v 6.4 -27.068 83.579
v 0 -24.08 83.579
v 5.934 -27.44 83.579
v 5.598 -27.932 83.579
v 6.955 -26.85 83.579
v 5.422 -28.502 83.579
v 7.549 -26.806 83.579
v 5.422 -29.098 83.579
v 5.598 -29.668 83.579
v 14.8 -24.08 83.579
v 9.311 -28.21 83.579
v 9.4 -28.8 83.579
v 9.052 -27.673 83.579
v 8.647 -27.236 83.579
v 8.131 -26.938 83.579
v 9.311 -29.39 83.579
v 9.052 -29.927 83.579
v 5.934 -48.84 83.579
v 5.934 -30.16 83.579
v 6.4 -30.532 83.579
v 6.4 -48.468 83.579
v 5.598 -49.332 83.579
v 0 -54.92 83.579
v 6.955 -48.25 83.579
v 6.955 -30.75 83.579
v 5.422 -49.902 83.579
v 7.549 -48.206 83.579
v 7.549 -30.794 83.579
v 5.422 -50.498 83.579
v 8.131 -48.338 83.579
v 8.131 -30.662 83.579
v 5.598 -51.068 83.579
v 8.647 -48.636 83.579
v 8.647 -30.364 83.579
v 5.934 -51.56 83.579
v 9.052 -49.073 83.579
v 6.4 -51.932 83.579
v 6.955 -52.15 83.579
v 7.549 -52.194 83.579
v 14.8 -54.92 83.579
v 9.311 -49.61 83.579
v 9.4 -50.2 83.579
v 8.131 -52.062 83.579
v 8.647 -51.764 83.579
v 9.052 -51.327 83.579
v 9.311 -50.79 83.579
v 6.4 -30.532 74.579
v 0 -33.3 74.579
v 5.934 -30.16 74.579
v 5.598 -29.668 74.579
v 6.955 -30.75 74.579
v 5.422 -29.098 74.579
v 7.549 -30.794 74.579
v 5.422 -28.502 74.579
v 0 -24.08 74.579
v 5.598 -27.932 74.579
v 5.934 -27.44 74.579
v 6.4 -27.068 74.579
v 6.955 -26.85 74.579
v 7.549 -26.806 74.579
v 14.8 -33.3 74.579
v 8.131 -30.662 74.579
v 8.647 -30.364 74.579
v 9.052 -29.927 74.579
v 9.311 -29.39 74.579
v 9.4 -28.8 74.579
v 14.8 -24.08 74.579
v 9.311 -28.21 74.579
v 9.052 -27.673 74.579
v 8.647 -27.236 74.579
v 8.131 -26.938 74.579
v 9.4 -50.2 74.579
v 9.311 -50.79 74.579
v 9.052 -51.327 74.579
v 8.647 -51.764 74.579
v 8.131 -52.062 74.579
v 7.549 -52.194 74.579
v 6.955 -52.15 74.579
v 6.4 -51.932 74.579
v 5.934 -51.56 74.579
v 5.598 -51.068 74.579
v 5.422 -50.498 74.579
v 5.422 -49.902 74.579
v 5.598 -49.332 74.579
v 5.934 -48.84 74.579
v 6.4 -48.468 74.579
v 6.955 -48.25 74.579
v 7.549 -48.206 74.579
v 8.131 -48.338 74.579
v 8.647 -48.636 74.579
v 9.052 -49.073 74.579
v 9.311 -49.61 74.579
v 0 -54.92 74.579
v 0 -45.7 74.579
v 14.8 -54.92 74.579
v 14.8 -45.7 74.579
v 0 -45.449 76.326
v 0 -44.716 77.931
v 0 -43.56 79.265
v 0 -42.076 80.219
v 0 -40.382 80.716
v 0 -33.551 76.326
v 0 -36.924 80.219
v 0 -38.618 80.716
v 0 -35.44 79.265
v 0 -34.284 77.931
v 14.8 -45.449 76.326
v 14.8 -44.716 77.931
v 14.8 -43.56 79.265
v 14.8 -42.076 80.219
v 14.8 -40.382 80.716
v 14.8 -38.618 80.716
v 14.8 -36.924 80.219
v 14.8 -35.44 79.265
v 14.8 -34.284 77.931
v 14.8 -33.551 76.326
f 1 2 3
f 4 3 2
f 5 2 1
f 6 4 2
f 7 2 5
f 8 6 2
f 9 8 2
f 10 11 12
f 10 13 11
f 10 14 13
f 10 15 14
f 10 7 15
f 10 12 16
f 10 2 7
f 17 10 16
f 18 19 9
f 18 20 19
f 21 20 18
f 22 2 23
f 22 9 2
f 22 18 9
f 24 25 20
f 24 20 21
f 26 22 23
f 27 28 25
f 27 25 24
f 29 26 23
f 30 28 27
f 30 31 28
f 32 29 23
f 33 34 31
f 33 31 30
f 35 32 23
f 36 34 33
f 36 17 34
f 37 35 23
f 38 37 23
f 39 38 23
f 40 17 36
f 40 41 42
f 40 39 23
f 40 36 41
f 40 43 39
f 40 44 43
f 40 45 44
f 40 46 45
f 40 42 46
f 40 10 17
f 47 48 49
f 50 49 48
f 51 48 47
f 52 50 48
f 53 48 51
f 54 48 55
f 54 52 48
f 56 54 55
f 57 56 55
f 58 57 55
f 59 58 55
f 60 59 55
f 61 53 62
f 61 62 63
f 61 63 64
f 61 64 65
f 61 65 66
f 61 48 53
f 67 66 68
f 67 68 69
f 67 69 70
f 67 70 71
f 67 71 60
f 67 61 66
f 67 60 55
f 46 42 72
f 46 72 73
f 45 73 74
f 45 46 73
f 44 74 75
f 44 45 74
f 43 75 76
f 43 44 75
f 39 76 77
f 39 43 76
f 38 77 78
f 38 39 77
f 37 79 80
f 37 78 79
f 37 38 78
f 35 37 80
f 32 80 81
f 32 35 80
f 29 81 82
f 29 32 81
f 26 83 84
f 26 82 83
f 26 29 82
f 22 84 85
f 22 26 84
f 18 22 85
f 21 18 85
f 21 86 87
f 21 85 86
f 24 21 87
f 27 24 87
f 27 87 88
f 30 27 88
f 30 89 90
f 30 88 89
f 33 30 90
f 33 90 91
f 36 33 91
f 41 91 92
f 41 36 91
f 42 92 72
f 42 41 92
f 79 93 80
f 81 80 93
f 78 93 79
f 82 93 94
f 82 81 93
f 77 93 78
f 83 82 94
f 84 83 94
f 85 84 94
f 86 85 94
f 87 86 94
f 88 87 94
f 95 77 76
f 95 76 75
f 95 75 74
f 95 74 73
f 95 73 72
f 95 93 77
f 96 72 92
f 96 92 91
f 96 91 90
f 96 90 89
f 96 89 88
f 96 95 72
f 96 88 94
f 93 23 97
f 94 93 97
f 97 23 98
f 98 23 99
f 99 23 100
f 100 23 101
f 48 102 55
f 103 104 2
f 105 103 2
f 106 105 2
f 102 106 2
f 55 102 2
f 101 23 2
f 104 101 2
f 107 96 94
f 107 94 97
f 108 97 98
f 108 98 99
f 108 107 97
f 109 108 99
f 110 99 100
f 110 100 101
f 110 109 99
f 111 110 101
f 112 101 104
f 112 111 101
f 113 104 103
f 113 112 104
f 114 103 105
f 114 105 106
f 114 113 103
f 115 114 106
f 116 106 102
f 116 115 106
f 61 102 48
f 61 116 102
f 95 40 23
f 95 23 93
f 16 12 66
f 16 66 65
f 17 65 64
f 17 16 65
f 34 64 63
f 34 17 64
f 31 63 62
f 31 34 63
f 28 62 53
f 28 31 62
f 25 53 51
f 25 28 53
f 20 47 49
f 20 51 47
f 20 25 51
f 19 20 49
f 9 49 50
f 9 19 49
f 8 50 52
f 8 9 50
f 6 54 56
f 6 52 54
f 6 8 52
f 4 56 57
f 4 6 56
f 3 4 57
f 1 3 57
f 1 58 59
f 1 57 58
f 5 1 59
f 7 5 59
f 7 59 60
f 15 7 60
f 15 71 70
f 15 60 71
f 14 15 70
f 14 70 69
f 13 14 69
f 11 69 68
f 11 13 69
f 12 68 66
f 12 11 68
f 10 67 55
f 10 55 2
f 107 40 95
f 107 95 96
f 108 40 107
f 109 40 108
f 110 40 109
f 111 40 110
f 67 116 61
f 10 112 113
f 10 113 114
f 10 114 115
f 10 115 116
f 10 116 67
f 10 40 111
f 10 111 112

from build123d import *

# Parameters (mm, degrees)
SKETCH2_W               = 180
SKETCH2_H               = 9
BOSS_EXTRUDE1_DEPTH     = 14.8
SKETCH7_W               = 90
SKETCH7_H               = 4.5
CUT_EXTRUDE1_DEPTH      = 92.319713096
FILLET1_R               = 8
BOSS_EXTRUDE2_DEPTH     = 14.8
CUT_EXTRUDE2_DEPTH      = 175.130679781
CUT_EXTRUDE2_DEPTH_BACK = 175.130679781
SKETCH11_R              = 2
CUT_EXTRUDE3_DEPTH      = 107.467114171
CUT_EXTRUDE3_DEPTH_BACK = 107.467114171


with BuildPart() as part:
    # Sketch2 → Boss-Extrude1 (new body)
    with BuildSketch(Plane(origin=(0, 0, 0), x_dir=(0, 0, -1), z_dir=(1, 0, 0))):
        Rectangle(SKETCH2_W, SKETCH2_H)
    extrude(amount=BOSS_EXTRUDE1_DEPTH)

    # Sketch7 → Cut-Extrude1 (cut, through all)
    with BuildSketch(Plane(origin=(14.8, 0, 0), x_dir=(0, 0, -1), z_dir=(1, 0, 0))):
        with Locations((0, -2.25)):
            Rectangle(SKETCH7_W, SKETCH7_H)
    extrude(amount=-CUT_EXTRUDE1_DEPTH, mode=Mode.SUBTRACT)

    # Fillet1
    # the kernel refuses this fillet: 8 mm, written as the material it adds along each edge
    with BuildSketch(Plane(origin=(14.8, 0, -45), x_dir=(0, -1, 0), z_dir=(-1, 0, 0))) as fillet1_piece_1:
        with BuildLine():
            CenterArc((8, 7.193747285), FILLET1_R, 180, 64.055520228)
            Line((0, 7.193747285), (-0.16, 7.193747285))
            Line((-0.16, 7.193747285), (-0.16, 0))
            Line((-0.16, 0), (0, -0.16))
            ThreePointArc((0, -0.16), (2.25, -0.16), (4.43, -0.143874946))
            Line((4.43, -0.143874946), (4.5, 0))
        make_face()
    extrude(amount=14.8)
    with BuildSketch(Plane(origin=(14.8, 0, 45), x_dir=(0, -1, 0), z_dir=(-1, 0, 0))) as fillet1_piece_2:
        with BuildLine():
            CenterArc((8, -7.193747285), FILLET1_R, 115.944479772, 64.055520228)
            Line((0, -7.193747285), (-0.16, -7.193747285))
            Line((-0.16, -7.193747285), (-0.16, 0))
            Line((-0.16, 0), (0, 0.16))
            ThreePointArc((0, 0.16), (2.25, 0.16), (4.43, 0.143874946))
            Line((4.43, 0.143874946), (4.5, 0))
        make_face()
    extrude(amount=14.8)

    # Sketch8 → Boss-Extrude2 (add)
    with BuildSketch(Plane(origin=(14.8, 0, 0), x_dir=(0, 0, -1), z_dir=(1, 0, 0))):
        with BuildLine():
            Line((83.579, -39.5), (83.579, -54.92))
            Line((83.579, -54.92), (74.579, -54.92))
            Line((74.579, -54.92), (74.579, -45.7))
            ThreePointArc((74.579, -45.7), (80.779, -39.5), (74.579, -33.3))
            Line((74.579, -33.3), (74.579, -4.5))
            Line((74.579, -4.5), (83.579, -4.5))
            Line((83.579, -4.5), (83.579, -39.5))
        make_face()
        with BuildLine():
            Line((-74.579, -54.92), (-74.579, -45.7))
            ThreePointArc((-74.579, -45.7), (-80.779, -39.5), (-74.579, -33.3))
            Line((-74.579, -33.3), (-74.579, -4.5))
            Line((-74.579, -4.5), (-83.579, -4.5))
            Line((-83.579, -4.5), (-83.579, -39.5))
            Line((-83.579, -39.5), (-83.579, -54.92))
            Line((-83.579, -54.92), (-74.579, -54.92))
        make_face()
    extrude(amount=-BOSS_EXTRUDE2_DEPTH)

    # Sketch11 → Cut-Extrude2 (cut, two sides: drawn at the far end of the back side and taken through both)
    with BuildSketch(Plane(origin=(0, 0, 74.579), x_dir=(-1, 0, 0), z_dir=(0, 0, -1)).offset(-CUT_EXTRUDE2_DEPTH_BACK)):
        with Locations(Location((-7.4, -28.8, 0), (0, 0, 180))):
            Circle(SKETCH11_R)
        with Locations(Location((-7.4, -50.2, 0), (0, 0, 180))):
            Circle(SKETCH11_R)
    extrude(amount=CUT_EXTRUDE2_DEPTH + CUT_EXTRUDE2_DEPTH_BACK, mode=Mode.SUBTRACT)

    # Sketch12 → Cut-Extrude3 (cut, two sides: drawn at the far end of the back side and taken through both)
    with BuildSketch(Plane.ZY.offset(-CUT_EXTRUDE3_DEPTH_BACK)):
        Polygon((96.986162818, 8.741450318), (-95.153164269, 8.741450318), (-95.153164269, -16.038890922), (-95.153164269, -24.08), (-95.153164269, -55.626735024), (-68.956122855, -55.626735024), (-68.956122855, -24.08), (74.579, -24.08), (96.986162818, -24.08), (96.986162818, -16.038890922), (96.986162818, -4.5), align=None)
    extrude(amount=CUT_EXTRUDE3_DEPTH + CUT_EXTRUDE3_DEPTH_BACK, mode=Mode.SUBTRACT)


solid = part.part
